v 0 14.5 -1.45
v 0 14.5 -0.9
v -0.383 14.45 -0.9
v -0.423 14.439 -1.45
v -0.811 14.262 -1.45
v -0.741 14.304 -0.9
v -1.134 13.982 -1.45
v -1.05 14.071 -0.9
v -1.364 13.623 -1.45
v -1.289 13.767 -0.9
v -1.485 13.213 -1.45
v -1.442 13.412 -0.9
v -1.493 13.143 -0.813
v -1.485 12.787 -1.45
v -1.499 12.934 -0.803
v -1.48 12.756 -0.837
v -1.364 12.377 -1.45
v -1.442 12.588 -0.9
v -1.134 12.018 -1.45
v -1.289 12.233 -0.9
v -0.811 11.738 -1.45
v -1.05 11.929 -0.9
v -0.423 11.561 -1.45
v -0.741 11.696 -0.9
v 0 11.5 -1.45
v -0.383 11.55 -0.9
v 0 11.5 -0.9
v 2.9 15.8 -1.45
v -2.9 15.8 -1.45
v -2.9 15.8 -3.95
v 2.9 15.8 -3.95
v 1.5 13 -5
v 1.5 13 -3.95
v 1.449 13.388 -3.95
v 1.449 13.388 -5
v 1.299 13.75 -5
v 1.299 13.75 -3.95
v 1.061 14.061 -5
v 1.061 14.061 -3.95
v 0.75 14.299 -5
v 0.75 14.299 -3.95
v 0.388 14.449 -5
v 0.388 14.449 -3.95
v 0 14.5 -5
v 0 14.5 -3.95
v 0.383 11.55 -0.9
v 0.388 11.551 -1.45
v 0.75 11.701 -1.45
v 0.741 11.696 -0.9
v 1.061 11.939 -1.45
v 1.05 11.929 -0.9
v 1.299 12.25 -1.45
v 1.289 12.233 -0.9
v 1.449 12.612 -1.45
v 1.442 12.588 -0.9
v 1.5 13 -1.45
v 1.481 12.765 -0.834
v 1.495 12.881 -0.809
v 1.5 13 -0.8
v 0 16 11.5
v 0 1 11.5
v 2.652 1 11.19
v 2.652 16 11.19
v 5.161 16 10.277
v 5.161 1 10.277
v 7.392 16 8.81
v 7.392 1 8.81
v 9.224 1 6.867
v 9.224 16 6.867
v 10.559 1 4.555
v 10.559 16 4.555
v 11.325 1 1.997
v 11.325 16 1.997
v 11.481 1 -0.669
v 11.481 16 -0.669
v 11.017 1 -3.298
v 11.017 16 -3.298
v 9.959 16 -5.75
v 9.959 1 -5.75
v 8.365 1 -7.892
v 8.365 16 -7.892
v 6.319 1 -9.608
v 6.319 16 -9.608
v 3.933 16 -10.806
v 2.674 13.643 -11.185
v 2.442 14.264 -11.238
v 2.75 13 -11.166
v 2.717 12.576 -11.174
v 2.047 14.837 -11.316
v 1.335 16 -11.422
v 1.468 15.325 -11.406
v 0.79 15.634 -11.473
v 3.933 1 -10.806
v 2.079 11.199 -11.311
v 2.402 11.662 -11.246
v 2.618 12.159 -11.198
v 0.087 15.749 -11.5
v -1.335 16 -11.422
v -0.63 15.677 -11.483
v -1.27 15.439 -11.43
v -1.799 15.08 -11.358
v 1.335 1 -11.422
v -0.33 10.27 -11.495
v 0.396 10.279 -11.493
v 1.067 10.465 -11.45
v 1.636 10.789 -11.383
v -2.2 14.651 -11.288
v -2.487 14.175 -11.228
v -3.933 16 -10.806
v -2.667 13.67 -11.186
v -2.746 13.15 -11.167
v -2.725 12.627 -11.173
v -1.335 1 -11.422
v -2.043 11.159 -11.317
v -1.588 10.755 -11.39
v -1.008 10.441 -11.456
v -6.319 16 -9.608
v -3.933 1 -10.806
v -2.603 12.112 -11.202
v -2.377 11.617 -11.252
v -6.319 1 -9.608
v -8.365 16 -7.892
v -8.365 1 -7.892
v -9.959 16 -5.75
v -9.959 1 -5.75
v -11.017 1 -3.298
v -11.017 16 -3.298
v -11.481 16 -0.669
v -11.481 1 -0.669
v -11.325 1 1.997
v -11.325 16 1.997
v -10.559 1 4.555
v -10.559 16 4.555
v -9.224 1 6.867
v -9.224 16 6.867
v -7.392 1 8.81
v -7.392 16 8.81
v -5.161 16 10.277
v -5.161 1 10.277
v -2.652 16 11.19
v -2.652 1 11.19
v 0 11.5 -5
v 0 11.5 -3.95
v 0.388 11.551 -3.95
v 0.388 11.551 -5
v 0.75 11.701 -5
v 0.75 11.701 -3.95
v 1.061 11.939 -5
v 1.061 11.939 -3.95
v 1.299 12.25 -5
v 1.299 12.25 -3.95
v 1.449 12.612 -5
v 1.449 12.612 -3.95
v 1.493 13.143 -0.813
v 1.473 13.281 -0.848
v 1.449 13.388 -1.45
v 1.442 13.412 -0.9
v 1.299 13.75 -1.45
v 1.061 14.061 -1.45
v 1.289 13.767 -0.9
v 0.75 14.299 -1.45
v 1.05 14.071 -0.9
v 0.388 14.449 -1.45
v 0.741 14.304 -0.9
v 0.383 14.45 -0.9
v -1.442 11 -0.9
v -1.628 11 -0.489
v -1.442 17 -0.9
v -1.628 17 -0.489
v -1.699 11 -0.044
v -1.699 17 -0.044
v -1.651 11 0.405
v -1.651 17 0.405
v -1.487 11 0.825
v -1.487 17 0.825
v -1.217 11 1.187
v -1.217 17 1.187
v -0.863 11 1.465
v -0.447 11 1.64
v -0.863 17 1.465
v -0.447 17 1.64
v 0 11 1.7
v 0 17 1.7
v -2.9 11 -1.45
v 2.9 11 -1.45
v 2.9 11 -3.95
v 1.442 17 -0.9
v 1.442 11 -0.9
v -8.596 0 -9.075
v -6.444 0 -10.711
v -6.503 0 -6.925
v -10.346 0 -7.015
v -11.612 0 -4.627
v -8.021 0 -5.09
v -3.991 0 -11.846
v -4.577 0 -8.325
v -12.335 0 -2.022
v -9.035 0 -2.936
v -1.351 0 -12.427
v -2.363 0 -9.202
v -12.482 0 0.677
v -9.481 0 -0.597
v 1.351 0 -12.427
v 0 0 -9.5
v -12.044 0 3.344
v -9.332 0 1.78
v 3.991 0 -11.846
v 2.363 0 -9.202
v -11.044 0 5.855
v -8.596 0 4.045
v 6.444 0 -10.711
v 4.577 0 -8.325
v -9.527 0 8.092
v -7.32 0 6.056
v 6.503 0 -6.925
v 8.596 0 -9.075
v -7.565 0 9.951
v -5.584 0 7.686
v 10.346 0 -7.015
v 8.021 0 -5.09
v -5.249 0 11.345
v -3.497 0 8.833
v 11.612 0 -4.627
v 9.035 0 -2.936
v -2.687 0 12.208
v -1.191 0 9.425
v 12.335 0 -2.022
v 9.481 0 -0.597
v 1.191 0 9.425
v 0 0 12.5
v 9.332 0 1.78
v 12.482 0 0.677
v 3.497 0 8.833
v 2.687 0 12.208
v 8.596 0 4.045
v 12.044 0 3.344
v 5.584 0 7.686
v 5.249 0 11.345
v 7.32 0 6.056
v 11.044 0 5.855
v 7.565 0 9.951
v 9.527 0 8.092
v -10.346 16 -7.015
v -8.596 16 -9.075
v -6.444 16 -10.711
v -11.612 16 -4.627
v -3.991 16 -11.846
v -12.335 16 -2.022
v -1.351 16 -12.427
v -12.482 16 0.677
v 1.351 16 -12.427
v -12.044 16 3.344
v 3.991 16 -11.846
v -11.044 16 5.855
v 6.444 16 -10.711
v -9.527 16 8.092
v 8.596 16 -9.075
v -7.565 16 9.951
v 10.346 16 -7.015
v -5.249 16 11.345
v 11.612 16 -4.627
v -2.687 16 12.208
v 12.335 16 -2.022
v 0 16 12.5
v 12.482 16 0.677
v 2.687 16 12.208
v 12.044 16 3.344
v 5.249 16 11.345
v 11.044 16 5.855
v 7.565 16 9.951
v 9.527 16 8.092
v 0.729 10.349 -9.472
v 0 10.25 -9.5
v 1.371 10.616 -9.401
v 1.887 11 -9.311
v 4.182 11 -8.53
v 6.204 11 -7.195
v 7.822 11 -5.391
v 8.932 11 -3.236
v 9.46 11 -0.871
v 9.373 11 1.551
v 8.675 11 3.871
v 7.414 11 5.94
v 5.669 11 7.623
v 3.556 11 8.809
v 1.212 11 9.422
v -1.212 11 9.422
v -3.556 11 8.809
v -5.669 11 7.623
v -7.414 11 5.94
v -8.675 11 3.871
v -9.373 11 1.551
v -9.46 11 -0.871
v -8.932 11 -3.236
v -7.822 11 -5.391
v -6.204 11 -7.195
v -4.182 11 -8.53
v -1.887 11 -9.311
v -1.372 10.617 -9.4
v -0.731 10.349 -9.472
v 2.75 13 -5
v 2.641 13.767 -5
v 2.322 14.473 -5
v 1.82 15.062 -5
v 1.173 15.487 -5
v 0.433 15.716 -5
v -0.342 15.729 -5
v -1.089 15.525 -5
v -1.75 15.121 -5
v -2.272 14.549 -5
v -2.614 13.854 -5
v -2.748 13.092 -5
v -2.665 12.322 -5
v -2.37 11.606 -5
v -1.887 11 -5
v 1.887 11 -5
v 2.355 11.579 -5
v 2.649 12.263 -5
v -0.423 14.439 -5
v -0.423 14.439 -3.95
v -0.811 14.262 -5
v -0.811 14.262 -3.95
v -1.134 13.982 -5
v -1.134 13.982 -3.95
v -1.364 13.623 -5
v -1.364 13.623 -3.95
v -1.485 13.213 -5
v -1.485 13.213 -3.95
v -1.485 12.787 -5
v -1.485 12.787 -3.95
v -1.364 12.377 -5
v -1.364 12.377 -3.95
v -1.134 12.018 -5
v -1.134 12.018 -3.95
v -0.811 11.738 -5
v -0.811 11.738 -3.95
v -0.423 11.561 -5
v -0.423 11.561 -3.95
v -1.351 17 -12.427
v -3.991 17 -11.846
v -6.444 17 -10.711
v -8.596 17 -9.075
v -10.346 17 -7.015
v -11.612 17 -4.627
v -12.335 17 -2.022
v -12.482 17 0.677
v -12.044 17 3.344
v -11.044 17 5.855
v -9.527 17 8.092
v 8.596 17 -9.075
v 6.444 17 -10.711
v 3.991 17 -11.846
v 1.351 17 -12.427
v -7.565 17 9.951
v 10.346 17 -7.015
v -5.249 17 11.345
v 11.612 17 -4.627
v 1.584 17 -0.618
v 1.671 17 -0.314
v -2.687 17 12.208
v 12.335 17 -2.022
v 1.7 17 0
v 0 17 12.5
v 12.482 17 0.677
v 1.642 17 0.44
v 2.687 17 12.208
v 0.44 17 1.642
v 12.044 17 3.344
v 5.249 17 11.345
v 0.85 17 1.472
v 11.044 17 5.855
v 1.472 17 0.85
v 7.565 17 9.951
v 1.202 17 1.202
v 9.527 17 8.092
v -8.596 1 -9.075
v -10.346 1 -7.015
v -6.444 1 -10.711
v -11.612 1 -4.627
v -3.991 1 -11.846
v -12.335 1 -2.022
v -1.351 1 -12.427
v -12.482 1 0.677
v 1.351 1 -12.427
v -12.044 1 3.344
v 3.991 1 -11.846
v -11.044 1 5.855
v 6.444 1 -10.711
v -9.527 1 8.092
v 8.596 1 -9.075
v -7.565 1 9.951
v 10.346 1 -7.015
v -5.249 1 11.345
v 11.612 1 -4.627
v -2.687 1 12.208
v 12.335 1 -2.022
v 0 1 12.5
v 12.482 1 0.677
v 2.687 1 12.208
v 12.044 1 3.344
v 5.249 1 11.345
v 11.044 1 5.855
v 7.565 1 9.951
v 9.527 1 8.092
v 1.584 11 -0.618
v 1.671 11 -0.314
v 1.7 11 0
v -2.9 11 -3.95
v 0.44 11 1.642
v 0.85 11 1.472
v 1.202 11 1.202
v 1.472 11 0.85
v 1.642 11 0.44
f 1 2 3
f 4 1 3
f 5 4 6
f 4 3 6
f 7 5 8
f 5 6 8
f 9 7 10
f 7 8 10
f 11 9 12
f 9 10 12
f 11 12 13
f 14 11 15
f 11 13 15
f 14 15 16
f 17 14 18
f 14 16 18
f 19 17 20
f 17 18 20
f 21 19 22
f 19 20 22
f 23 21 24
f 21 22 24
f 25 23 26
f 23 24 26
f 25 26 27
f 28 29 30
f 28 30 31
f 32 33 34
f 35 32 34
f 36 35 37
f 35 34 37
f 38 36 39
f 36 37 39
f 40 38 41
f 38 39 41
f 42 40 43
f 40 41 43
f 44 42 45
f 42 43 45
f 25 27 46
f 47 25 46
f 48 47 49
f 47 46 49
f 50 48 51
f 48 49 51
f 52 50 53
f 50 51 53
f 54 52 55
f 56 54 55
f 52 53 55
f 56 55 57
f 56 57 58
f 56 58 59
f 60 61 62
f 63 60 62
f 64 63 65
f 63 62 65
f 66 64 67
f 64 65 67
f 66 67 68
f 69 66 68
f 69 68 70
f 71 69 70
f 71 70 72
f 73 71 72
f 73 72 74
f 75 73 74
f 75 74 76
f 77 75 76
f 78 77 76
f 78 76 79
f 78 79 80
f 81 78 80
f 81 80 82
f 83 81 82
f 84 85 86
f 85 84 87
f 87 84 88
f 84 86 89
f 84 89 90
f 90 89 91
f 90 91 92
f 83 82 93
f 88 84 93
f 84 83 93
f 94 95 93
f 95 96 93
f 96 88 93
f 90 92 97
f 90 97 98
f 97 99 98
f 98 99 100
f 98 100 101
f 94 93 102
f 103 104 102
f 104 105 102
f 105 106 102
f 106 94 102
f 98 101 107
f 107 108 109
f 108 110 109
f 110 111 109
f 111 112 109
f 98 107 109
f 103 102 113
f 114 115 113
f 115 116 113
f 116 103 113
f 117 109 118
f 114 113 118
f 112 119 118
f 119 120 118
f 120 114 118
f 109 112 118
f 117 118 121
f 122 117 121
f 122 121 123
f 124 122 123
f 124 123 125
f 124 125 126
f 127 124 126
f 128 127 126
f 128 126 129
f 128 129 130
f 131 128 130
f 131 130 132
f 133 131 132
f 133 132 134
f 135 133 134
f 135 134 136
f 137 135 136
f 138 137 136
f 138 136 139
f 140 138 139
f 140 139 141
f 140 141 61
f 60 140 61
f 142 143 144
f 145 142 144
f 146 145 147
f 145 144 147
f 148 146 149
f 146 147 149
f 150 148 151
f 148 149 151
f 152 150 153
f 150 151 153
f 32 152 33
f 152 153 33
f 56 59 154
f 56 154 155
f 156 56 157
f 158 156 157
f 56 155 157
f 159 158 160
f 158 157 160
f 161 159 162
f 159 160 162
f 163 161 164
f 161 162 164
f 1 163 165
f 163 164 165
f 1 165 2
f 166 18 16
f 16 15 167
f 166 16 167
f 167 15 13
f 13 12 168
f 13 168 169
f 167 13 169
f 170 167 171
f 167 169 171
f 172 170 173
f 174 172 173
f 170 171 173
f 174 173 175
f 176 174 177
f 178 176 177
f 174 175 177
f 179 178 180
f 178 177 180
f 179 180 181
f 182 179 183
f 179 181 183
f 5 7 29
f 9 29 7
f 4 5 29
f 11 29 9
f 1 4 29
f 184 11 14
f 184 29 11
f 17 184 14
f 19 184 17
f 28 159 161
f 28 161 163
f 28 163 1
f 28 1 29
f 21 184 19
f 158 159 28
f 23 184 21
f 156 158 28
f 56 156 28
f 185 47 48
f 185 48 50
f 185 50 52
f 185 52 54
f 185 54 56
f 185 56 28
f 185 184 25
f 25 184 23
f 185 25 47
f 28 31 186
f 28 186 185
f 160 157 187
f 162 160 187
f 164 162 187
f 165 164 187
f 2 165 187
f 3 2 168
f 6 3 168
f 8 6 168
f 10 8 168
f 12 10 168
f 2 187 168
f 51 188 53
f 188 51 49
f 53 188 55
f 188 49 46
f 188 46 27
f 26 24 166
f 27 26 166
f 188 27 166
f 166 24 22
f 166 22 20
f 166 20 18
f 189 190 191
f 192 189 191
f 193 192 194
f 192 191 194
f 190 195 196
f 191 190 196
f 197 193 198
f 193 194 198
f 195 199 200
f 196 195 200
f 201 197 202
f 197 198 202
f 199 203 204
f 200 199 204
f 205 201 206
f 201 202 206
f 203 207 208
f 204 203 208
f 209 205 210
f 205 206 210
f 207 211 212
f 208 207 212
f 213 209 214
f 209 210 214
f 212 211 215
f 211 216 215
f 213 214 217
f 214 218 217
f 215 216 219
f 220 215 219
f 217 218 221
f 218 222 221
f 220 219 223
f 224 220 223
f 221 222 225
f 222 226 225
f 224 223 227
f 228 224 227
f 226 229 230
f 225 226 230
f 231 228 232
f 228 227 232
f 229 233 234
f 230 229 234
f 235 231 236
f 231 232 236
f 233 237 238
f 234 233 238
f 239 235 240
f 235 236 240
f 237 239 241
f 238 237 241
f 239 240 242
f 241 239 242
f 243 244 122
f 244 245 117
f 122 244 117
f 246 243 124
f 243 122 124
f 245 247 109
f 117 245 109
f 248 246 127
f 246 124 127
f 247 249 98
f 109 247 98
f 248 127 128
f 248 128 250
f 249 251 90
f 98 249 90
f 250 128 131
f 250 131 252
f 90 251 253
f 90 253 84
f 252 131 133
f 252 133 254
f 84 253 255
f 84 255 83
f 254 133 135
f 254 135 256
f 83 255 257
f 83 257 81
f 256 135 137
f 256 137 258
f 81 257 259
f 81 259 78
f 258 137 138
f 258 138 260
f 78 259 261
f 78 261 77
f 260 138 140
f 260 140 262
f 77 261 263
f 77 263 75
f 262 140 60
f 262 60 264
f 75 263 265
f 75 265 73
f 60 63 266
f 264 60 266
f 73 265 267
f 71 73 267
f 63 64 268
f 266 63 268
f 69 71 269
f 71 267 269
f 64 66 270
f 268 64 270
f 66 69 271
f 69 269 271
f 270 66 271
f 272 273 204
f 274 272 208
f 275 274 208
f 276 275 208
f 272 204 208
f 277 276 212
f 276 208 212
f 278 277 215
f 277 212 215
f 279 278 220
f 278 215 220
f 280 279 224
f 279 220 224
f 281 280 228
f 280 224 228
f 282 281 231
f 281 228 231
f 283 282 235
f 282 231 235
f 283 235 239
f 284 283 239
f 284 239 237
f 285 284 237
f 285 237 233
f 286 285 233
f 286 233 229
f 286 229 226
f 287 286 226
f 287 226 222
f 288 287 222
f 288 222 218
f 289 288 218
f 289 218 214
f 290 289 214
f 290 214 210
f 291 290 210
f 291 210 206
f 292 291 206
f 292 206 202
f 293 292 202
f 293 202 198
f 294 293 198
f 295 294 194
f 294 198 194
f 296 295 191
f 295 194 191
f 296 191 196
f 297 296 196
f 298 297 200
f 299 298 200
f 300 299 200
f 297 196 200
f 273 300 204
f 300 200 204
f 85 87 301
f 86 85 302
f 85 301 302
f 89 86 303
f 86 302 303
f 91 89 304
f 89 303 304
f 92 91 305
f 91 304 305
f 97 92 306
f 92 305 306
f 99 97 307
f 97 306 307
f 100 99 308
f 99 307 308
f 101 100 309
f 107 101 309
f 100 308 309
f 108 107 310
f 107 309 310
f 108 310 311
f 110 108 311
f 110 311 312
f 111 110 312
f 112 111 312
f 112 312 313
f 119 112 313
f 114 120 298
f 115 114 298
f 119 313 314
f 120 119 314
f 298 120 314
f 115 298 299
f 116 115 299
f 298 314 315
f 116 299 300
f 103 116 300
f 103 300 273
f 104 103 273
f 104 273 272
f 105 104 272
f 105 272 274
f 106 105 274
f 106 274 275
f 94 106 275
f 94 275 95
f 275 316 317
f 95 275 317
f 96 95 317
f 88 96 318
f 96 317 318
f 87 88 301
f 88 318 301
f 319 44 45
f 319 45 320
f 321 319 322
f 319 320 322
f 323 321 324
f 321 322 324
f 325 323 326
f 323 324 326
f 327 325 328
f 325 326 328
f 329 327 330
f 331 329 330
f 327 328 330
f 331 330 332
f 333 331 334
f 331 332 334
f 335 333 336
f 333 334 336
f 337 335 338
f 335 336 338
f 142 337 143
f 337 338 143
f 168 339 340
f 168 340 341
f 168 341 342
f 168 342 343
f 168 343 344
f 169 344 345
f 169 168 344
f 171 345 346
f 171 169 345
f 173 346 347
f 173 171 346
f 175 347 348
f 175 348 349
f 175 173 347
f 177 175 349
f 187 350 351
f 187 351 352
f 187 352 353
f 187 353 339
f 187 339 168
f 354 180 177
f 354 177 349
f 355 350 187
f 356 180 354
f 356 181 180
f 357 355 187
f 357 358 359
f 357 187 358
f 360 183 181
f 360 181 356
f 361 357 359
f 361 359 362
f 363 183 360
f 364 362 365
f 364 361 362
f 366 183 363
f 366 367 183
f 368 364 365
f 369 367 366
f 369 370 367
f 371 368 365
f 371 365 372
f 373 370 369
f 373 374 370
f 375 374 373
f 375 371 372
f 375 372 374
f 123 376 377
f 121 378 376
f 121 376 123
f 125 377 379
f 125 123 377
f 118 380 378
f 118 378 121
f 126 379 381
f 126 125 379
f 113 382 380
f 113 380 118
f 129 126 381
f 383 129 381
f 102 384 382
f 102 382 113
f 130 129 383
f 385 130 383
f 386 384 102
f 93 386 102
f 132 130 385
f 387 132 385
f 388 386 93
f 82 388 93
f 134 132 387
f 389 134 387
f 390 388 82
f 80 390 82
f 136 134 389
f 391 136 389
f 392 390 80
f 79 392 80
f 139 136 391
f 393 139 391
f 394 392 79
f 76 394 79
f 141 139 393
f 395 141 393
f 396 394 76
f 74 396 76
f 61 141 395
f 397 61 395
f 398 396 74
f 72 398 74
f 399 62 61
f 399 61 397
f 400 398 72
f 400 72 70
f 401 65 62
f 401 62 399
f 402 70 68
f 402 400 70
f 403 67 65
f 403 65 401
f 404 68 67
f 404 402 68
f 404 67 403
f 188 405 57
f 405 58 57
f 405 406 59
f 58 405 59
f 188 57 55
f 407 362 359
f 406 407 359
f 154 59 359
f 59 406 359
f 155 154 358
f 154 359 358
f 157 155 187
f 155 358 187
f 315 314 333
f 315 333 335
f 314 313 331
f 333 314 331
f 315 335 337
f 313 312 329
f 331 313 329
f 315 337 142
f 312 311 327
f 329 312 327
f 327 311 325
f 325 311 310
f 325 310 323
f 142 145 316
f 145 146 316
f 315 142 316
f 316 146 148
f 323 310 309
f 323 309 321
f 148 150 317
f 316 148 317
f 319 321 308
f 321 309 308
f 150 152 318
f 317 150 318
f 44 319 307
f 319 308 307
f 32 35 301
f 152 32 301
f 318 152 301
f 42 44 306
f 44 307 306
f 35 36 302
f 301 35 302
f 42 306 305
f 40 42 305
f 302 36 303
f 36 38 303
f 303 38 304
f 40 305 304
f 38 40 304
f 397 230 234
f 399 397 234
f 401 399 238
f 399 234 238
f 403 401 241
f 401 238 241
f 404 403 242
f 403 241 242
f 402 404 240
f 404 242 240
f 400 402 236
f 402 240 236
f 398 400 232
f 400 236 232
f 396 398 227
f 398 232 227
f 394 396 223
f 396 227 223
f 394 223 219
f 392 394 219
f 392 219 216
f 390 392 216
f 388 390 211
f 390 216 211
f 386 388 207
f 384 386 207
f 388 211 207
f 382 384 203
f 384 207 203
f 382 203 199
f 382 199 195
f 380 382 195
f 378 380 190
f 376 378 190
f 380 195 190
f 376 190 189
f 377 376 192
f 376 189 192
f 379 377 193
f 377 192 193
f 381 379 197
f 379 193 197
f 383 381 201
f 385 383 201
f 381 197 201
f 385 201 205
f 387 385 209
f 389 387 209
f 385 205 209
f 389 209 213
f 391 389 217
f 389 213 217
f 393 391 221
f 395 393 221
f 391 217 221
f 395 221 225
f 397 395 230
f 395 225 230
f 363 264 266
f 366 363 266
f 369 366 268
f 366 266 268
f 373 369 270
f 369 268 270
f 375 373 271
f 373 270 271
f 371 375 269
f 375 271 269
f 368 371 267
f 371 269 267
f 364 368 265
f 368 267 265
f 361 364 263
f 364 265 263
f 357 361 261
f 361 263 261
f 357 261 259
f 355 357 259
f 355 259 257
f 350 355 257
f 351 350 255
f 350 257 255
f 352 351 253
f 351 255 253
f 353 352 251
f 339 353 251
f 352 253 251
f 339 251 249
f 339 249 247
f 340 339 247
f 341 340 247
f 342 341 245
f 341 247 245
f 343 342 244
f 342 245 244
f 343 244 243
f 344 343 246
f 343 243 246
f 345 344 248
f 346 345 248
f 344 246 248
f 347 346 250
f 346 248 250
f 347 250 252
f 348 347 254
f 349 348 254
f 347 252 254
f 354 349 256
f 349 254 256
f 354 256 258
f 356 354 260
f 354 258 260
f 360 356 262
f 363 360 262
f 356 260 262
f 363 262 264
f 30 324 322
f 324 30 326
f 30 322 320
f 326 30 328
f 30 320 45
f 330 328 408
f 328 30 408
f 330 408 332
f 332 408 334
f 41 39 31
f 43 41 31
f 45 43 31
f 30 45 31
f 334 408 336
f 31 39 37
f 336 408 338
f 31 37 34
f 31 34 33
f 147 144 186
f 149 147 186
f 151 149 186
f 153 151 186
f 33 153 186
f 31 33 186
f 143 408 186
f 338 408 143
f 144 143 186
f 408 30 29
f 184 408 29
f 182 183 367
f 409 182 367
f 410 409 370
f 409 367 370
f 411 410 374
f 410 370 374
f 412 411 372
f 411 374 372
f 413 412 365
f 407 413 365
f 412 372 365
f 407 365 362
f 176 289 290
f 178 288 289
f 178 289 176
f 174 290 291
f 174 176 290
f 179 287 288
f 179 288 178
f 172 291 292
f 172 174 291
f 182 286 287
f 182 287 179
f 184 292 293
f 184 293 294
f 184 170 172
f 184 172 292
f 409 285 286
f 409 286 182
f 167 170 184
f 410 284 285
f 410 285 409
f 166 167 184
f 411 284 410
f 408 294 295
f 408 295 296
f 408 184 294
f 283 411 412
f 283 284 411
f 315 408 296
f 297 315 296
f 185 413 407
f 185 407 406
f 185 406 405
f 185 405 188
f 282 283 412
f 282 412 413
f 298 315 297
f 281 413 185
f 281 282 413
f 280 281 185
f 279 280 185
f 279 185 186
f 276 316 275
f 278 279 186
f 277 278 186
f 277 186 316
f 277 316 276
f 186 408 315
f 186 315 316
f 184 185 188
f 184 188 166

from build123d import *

# Parameters (mm, degrees)
ESBO_O1_R                = 12.5
RESSALTO_EXTRUS_O1_DEPTH = 1
ESBO_O2_R                = 11.5
RESSALTO_EXTRUS_O2_DEPTH = 15
ESBO_O3_R                = 12.5
RESSALTO_EXTRUS_O3_DEPTH = 1
CORTE_EXTRUS_O1_DEPTH    = 12
CORTE_EXTRUS_O2_DEPTH    = 35
CORTE_EXTRUS_O3_START    = -5
ESBO_O7_R                = 2.75
CORTE_EXTRUS_O3_DEPTH    = 35
ESBO_O8_R                = 9.5
CORTE_EXTRUS_O4_DEPTH    = 11
ESBO_O9_W                = 5.8
ESBO_O9_H                = 2.5
CORTE_EXTRUS_O5_DEPTH    = 4.8


with BuildPart() as part:
    # Esboço1 → Ressalto-extrusão1 (new body)
    with BuildSketch(Plane(origin=(0, 0, 0), x_dir=(1, 0, 0), z_dir=(0, 1, 0))):
        with Locations(Location((0, 0, 0), (0, 0, 270))):
            Circle(ESBO_O1_R)
    extrude(amount=RESSALTO_EXTRUS_O1_DEPTH)

    # Esboço2 → Ressalto-extrusão2 (add)
    with BuildSketch(Plane(origin=(0, 1, 0), x_dir=(1, 0, 0), z_dir=(0, 1, 0))):
        with Locations(Location((0, 0, 0), (0, 0, 270))):
            Circle(ESBO_O2_R)
    extrude(amount=RESSALTO_EXTRUS_O2_DEPTH)

    # Esboço3 → Ressalto-extrusão3 (add)
    with BuildSketch(Plane(origin=(0, 16, 0), x_dir=(1, 0, 0), z_dir=(0, 1, 0))):
        with Locations(Location((0, 0, 0), (0, 0, 270))):
            Circle(ESBO_O3_R)
    extrude(amount=RESSALTO_EXTRUS_O3_DEPTH)

    # Esboço4 → Corte-extrusão1 (cut)
    with BuildSketch(Plane(origin=(0, 17, 0), x_dir=(1, 0, 0), z_dir=(0, 1, 0))):
        with BuildLine():
            ThreePointArc((-1.44222051, 0.9), (-1.486606875, -0.824621125), (0, -1.7))
            Line((0, -1.7), (0, 0.9))
            Line((0, 0.9), (-1.44222051, 0.9))
        make_face()
        with BuildLine():
            Line((0, 0.9), (0, -1.7))
            ThreePointArc((0, -1.7), (1.202081528, -1.202081528), (1.7, 0))
            ThreePointArc((1.7, 0), (1.634284992, 0.468094613), (1.44222051, 0.9))
            Line((1.44222051, 0.9), (0, 0.9))
        make_face()
    extrude(amount=-CORTE_EXTRUS_O1_DEPTH, mode=Mode.SUBTRACT)

    # Esboço6 → Corte-extrusão2 (cut)
    with BuildSketch(Plane.XY):
        with BuildLine():
            ThreePointArc((0, 14.5), (-1.5, 13), (0, 11.5))
            Line((0, 11.5), (0, 13))
            Line((0, 13), (0, 14.5))
        make_face()
        with BuildLine():
            Line((0, 13), (0, 11.5))
            ThreePointArc((0, 11.5), (1.060660172, 11.939339828), (1.5, 13))
            ThreePointArc((1.5, 13), (1.060660172, 14.060660172), (0, 14.5))
            Line((0, 14.5), (0, 13))
        make_face()
    extrude(amount=-CORTE_EXTRUS_O2_DEPTH, mode=Mode.SUBTRACT)

    # Esboço7 → Corte-extrusão3 (cut)
    with BuildSketch(Plane.XY.offset(CORTE_EXTRUS_O3_START)):
        with Locations((0, 13)):
            Circle(ESBO_O7_R)
    extrude(amount=-CORTE_EXTRUS_O3_DEPTH, mode=Mode.SUBTRACT)

    # Esboço8 → Corte-extrusão4 (cut)
    with BuildSketch(Plane(origin=(0, 0, 0), x_dir=(-1, 0, 0), z_dir=(0, -1, 0))):
        with Locations(Location((0, 0, 0), (0, 0, 90))):
            Circle(ESBO_O8_R)
    extrude(amount=-CORTE_EXTRUS_O4_DEPTH, mode=Mode.SUBTRACT)

    # Esboço9 → Corte-extrusão5 (cut)
    with BuildSketch(Plane.XZ.offset(-11)):
        with Locations((0, -2.700284177)):
            Rectangle(ESBO_O9_W, ESBO_O9_H)
    extrude(amount=-CORTE_EXTRUS_O5_DEPTH, mode=Mode.SUBTRACT)


solid = part.part
